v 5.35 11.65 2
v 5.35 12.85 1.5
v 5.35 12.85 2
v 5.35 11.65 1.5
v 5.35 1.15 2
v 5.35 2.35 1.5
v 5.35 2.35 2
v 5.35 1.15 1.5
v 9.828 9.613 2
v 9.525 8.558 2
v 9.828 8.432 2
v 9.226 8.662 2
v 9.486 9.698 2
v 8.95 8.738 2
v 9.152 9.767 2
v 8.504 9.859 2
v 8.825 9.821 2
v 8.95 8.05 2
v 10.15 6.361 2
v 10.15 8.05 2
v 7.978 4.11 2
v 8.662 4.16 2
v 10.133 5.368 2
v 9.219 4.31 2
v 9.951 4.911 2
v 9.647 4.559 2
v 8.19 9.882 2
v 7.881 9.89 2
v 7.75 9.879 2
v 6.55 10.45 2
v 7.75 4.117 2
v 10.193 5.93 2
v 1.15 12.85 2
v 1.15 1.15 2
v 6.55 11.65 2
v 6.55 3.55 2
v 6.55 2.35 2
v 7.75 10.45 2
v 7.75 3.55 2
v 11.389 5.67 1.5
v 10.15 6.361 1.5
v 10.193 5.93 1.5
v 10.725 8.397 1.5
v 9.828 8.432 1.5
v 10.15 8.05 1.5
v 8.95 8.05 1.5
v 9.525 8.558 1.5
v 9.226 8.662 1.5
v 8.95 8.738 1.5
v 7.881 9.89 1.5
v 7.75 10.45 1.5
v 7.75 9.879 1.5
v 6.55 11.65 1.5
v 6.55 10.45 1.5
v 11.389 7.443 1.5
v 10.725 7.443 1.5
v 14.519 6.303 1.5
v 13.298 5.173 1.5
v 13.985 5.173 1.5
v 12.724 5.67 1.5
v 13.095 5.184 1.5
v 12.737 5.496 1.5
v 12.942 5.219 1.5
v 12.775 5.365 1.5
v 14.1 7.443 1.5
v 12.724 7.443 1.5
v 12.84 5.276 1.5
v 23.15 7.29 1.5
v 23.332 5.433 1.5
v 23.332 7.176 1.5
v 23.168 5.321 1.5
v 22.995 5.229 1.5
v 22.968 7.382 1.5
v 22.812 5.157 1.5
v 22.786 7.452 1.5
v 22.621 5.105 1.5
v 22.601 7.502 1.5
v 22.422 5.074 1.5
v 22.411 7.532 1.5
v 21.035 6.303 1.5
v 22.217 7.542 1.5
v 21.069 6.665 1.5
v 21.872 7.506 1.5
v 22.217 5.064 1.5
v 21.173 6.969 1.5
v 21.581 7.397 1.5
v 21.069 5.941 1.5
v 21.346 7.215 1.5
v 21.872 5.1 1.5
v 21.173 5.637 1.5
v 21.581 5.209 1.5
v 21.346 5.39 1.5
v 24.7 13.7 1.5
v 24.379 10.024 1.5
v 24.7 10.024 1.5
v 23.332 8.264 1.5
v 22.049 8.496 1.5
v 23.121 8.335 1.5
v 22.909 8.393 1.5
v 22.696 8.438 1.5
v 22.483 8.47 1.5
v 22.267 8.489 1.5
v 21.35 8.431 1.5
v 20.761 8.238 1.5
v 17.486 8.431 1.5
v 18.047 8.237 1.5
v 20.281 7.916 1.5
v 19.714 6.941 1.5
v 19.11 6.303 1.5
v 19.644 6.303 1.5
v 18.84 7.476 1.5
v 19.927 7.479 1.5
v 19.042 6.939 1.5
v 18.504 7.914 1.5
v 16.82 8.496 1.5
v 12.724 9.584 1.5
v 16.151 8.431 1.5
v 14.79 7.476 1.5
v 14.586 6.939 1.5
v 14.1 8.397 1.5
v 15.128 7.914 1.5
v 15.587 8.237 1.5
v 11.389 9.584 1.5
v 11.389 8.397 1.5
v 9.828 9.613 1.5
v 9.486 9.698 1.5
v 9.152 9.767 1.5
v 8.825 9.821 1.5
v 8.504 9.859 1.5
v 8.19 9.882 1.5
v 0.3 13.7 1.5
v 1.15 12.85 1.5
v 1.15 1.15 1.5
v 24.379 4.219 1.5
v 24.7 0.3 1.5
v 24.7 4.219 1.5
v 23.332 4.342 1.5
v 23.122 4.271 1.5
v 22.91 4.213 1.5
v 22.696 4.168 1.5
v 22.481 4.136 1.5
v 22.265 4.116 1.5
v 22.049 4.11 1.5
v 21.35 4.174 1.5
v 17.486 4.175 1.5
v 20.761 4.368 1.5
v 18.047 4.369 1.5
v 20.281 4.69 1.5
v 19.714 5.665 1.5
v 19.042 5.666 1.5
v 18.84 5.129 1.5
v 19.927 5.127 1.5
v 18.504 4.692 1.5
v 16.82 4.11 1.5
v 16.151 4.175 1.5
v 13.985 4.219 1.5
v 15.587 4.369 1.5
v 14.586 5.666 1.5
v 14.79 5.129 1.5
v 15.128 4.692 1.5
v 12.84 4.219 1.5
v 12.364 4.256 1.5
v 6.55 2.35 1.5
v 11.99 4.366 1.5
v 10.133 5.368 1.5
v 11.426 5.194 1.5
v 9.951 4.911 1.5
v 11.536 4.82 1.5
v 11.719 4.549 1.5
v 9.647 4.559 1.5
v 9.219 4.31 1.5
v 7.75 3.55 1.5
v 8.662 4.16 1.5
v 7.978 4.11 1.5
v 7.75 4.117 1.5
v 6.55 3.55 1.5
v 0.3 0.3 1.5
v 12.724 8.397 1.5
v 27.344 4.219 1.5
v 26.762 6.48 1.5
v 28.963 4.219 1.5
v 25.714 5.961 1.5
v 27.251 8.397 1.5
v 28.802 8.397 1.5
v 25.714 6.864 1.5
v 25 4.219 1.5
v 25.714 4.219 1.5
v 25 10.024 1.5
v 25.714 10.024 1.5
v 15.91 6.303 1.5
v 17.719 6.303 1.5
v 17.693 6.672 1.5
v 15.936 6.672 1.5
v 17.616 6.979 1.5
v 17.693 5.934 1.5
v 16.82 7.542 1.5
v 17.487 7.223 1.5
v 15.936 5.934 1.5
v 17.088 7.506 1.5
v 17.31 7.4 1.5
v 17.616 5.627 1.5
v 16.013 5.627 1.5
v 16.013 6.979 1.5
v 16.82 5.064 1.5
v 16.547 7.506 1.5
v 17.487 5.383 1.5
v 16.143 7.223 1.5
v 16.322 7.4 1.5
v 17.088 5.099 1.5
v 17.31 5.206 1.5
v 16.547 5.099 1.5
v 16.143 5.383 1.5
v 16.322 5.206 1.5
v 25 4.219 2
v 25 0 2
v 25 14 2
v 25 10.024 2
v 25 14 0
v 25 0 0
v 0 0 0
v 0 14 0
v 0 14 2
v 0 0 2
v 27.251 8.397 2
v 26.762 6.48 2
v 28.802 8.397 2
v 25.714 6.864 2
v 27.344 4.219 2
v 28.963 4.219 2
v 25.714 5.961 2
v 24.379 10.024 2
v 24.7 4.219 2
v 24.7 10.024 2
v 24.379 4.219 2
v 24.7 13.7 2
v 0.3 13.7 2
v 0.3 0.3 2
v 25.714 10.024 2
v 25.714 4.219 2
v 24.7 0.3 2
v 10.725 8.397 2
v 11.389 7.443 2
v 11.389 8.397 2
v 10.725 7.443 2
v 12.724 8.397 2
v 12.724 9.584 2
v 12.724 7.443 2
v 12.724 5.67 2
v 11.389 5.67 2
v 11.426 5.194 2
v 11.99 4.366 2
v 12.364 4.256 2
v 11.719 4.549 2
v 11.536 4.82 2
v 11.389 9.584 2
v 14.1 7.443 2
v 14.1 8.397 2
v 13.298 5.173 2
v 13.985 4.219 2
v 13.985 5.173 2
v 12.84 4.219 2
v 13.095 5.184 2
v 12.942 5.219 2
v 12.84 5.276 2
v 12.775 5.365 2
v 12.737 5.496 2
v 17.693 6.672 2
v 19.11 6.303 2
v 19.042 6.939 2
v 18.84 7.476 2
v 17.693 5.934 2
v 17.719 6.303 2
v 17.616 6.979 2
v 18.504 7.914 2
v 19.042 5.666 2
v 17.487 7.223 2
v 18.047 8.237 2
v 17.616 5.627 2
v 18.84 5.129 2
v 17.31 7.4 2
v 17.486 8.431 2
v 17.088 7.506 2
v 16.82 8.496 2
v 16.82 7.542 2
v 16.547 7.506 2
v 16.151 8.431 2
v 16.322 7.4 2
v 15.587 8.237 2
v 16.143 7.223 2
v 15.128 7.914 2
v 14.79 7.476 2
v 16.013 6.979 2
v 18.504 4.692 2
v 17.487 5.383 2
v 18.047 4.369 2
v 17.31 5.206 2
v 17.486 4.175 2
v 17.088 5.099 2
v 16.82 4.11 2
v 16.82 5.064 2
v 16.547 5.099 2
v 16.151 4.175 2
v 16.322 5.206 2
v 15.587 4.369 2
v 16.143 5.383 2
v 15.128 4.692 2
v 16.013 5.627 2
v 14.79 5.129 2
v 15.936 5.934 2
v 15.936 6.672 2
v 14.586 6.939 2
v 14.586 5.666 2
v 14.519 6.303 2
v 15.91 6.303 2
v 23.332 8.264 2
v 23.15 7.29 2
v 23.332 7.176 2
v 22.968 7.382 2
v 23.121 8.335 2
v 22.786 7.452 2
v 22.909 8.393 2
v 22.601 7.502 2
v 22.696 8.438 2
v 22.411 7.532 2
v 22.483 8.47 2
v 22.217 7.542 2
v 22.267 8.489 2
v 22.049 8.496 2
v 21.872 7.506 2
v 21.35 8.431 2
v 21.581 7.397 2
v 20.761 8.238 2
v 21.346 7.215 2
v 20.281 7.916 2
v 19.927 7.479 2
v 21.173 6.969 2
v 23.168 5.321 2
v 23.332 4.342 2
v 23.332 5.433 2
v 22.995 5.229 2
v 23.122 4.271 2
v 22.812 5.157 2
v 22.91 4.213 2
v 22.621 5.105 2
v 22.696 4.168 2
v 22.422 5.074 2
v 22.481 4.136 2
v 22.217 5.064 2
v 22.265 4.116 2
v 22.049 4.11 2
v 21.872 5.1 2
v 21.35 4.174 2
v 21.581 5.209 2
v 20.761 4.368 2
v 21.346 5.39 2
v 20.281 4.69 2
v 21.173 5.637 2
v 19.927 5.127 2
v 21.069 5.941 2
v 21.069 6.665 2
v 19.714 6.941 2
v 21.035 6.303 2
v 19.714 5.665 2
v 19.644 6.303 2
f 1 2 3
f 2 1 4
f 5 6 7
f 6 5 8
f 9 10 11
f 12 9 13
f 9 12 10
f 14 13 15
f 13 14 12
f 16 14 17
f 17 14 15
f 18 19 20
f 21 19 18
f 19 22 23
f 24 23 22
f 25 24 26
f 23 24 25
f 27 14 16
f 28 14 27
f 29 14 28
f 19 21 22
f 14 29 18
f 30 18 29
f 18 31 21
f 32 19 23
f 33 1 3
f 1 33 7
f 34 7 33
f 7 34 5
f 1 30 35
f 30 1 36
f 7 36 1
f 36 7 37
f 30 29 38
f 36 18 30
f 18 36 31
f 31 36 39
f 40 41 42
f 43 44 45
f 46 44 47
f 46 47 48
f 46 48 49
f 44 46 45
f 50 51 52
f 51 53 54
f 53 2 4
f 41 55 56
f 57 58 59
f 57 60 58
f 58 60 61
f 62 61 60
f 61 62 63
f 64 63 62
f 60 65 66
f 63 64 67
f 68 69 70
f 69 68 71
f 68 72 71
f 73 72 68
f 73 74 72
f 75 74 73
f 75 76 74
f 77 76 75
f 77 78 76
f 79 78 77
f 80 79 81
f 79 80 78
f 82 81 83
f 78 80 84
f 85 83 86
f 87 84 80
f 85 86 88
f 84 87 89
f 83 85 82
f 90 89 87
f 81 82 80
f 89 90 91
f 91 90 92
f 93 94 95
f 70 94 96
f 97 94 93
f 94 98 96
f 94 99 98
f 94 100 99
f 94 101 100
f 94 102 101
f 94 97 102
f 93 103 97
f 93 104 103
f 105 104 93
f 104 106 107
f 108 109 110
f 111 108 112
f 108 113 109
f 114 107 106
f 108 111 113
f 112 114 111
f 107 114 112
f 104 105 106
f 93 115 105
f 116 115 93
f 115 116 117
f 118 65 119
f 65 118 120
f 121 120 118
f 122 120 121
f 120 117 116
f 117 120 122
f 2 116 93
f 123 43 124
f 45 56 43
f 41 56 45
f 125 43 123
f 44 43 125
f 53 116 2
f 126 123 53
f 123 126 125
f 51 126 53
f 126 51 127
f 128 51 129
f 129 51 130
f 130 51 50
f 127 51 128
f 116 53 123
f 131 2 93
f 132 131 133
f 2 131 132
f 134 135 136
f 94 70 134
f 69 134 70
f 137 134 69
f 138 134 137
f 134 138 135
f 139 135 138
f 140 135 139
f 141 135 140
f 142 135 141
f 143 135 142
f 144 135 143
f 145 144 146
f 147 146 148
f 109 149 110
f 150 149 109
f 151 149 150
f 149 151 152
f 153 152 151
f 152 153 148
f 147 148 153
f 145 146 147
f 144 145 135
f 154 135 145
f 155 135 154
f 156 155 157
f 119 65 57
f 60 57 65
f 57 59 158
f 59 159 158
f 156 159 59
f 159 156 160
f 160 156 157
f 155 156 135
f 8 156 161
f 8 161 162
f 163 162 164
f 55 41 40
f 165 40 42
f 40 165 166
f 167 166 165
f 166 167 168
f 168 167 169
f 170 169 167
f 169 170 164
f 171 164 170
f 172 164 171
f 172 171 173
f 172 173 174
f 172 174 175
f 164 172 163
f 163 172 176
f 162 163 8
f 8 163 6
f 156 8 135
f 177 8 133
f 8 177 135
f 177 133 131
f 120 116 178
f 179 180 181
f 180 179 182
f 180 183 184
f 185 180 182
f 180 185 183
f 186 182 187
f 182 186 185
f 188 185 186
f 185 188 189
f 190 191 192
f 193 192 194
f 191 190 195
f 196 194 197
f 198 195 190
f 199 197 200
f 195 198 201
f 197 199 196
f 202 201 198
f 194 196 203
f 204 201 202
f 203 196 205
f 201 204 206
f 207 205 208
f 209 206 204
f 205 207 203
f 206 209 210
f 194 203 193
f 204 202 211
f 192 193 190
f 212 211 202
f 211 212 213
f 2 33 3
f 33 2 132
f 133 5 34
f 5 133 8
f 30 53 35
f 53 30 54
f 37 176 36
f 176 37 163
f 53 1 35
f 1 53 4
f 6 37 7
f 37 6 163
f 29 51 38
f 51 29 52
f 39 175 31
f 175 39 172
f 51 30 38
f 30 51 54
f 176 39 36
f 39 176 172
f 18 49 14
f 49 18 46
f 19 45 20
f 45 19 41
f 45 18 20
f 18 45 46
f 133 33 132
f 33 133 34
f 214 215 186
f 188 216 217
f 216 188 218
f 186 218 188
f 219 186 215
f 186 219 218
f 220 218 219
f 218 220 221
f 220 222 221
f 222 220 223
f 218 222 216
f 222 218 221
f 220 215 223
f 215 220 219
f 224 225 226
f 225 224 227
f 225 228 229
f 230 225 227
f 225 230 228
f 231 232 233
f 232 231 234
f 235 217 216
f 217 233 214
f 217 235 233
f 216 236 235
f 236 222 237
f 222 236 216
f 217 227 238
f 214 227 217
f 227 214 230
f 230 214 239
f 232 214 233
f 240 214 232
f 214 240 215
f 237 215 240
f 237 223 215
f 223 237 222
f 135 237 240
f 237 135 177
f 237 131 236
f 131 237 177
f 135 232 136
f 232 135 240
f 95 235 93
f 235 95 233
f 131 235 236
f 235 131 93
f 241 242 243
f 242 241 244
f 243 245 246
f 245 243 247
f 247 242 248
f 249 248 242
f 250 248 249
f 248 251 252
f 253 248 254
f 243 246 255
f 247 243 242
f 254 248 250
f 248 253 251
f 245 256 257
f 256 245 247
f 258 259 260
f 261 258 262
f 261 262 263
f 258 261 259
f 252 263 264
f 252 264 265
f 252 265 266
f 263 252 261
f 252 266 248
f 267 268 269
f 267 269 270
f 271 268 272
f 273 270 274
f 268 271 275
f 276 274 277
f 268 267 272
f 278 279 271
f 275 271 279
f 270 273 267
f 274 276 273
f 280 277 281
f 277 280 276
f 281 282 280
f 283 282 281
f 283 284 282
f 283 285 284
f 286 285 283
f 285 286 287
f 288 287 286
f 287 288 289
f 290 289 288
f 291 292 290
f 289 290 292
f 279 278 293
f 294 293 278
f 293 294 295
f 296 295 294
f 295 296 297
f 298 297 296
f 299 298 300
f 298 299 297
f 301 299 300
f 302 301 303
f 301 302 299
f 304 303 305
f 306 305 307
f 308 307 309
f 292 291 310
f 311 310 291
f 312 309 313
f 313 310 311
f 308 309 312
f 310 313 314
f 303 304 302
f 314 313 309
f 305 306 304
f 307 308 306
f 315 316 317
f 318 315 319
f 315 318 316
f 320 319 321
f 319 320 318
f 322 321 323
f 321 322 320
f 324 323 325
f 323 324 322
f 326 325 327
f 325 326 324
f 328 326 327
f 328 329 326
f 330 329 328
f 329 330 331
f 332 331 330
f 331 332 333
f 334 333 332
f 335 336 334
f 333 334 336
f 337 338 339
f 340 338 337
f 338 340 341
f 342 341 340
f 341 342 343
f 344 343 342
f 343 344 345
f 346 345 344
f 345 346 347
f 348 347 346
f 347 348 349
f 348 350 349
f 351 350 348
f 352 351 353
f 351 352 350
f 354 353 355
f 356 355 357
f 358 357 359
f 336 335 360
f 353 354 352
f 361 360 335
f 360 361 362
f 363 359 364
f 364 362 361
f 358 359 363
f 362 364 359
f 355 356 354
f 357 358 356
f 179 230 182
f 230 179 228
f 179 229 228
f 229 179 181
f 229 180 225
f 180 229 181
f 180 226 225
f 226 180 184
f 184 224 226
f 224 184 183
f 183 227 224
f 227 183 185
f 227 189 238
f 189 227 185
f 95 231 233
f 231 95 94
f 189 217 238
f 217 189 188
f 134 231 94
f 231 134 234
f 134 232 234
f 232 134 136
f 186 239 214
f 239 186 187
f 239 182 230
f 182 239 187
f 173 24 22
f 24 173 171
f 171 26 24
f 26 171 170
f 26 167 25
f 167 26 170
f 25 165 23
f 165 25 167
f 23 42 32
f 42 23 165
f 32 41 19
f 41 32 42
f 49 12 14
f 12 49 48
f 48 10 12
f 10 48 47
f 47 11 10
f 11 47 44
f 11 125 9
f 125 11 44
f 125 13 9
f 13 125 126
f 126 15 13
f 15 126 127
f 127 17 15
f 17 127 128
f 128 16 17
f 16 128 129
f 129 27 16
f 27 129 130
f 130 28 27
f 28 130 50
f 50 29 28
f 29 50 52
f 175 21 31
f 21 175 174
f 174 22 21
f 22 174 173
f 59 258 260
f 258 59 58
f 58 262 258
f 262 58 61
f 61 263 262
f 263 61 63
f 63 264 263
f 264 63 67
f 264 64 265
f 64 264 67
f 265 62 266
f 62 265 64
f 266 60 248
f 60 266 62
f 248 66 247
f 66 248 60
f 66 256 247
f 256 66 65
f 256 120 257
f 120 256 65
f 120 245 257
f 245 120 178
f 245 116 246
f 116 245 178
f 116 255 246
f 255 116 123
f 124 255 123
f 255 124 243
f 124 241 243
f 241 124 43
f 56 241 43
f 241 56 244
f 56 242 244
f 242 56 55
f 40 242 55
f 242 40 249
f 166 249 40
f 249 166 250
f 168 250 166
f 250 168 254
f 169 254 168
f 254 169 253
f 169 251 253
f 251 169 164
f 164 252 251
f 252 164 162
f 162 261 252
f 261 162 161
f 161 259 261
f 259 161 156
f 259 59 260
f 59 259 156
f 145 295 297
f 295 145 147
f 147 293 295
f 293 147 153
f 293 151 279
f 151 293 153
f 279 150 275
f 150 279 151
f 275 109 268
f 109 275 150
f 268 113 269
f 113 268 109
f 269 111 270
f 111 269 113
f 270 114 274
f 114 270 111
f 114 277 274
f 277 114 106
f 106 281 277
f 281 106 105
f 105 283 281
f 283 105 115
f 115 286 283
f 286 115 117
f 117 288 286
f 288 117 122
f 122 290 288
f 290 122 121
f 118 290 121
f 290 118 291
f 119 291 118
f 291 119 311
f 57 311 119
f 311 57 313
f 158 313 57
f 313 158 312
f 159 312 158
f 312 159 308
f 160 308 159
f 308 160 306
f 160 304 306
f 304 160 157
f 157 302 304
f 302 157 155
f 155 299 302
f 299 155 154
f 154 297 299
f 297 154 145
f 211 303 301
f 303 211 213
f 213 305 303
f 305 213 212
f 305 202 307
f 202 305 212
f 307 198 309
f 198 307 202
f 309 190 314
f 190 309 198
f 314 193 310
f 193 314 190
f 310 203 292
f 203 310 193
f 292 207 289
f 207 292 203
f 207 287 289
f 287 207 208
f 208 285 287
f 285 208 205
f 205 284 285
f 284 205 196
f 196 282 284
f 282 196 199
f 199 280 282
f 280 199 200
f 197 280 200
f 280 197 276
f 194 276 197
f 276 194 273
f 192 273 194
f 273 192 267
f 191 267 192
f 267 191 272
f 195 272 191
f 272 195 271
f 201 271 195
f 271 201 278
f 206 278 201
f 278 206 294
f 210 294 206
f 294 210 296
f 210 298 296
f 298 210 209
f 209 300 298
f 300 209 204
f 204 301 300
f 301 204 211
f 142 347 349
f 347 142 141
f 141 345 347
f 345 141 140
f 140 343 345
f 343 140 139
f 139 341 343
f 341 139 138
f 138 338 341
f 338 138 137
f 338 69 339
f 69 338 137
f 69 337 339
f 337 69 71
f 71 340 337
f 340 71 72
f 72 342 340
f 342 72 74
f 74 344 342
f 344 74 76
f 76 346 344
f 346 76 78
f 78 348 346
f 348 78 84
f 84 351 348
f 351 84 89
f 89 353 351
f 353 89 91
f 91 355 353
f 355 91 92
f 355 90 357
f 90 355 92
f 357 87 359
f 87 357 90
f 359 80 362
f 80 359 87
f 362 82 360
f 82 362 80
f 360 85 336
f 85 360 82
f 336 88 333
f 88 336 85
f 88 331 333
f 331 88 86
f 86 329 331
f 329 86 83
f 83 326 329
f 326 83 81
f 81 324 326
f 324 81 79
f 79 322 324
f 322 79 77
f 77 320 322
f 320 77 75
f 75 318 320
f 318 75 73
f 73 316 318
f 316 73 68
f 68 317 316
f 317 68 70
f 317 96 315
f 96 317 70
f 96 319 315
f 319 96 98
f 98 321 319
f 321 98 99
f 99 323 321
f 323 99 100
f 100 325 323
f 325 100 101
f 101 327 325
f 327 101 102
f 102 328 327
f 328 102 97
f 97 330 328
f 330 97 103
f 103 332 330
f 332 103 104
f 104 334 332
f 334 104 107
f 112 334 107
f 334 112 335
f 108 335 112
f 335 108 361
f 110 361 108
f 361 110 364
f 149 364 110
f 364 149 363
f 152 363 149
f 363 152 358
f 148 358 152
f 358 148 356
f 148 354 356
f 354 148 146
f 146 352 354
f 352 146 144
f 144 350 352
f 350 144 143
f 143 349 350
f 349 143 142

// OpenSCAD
// file: CommonModules.scad
//    $$$$$$\   $$$$$$\   $$$$$$\  $$\   $$\ $$$$$$\ $$$$$$$\  $$$$$$$$\ 
//    $$  __$$\ $$  __$$\ $$  __$$\ $$ |  $$ |\_$$  _|$$  __$$\ $$  _____|
//    $$ /  $$ |$$ /  \__|$$ /  $$ |$$ |  $$ |  $$ |  $$ |  $$ |$$ |      
//    $$$$$$$$ |$$ |      $$ |  $$ |$$ |  $$ |  $$ |  $$$$$$$  |$$$$$\    
//    $$  __$$ |$$ |      $$ |  $$ |$$ |  $$ |  $$ |  $$  __$$< $$  __|   
//    $$ |  $$ |$$ |  $$\ $$ $$\$$ |$$ |  $$ |  $$ |  $$ |  $$ |$$ |      
//    $$ |  $$ |\$$$$$$  |\$$$$$$ / \$$$$$$  |$$$$$$\ $$ |  $$ |$$$$$$$$\ 
//    \__|  \__| \______/  \___$$$\  \______/ \______|\__|  \__|\________|
//                            \___|                                      
//      
//       Print and play - OpenScad project - by Bekkalizer - GPLv3
// 
// This file is part of the Acquire stl project.
// Copyright (C) 2025 Bekkalizer
//
// Acquire stl project is free software: you can redistribute it and/or modify
// it under the terms of the GNU General Public License as published
// by the Free Software Foundation, either version 3 of the License,
// or (at your option) any later version.
//
// Acquire stl project is distributed in the hope that it will be useful,
// but WITHOUT ANY WARRANTY; without even the implied warranty of
// MERCHANTABILITY or FITNESS FOR A PARTICULAR PURPOSE. See the
// GNU General Public License for more details.
//
// You should have received a copy of the GNU General Public License
// along with this program. If not, see <https://www.gnu.org/licenses/>.

module cube_with_extruded_bottom( cube_size = [19.5, 19.5, 5] ) {
    //Main build script parameters:
    max_width = 19.2;
    top_lip = 2;
    top_height = 3;
    //Calculated hole size:
    inside_margins = 1;
    hole_width = max_width - 2 * (top_lip) + inside_margins;
    hole_height = top_height + inside_margins;
    
    hole_size = [hole_width, hole_width, hole_height]; // Hole dimensions (same height as cube)
    hole_offset = [(cube_size[0] - hole_size[0]) / 2, (cube_size[1] - hole_size[1]) / 2, -0.1]; // Centered on bottom
    difference() {
        // Main Cube
        cube(cube_size);
        
        // Hole Cube (subtracting from bottom)
        translate(hole_offset)
            cube(hole_size);
    }
}
// main file
//    $$$$$$\   $$$$$$\   $$$$$$\  $$\   $$\ $$$$$$\ $$$$$$$\  $$$$$$$$\ 
//    $$  __$$\ $$  __$$\ $$  __$$\ $$ |  $$ |\_$$  _|$$  __$$\ $$  _____|
//    $$ /  $$ |$$ /  \__|$$ /  $$ |$$ |  $$ |  $$ |  $$ |  $$ |$$ |      
//    $$$$$$$$ |$$ |      $$ |  $$ |$$ |  $$ |  $$ |  $$$$$$$  |$$$$$\    
//    $$  __$$ |$$ |      $$ |  $$ |$$ |  $$ |  $$ |  $$  __$$< $$  __|   
//    $$ |  $$ |$$ |  $$\ $$ $$\$$ |$$ |  $$ |  $$ |  $$ |  $$ |$$ |      
//    $$ |  $$ |\$$$$$$  |\$$$$$$ / \$$$$$$  |$$$$$$\ $$ |  $$ |$$$$$$$$\ 
//    \__|  \__| \______/  \___$$$\  \______/ \______|\__|  \__|\________|
//                            \___|                                      
//      
//       Print and play - OpenScad project - by Bekkalizer - GPLv3
// 
// This file is part of the Acquire stl project.
// Copyright (C) 2025 Bekkalizer
//
// Acquire stl project is free software: you can redistribute it and/or modify
// it under the terms of the GNU General Public License as published
// by the Free Software Foundation, either version 3 of the License,
// or (at your option) any later version.
//
// Acquire stl project is distributed in the hope that it will be useful,
// but WITHOUT ANY WARRANTY; without even the implied warranty of
// MERCHANTABILITY or FITNESS FOR A PARTICULAR PURPOSE. See the
// GNU General Public License for more details.
//
// You should have received a copy of the GNU General Public License
// along with this program. If not, see <https://www.gnu.org/licenses/>.

use <CommonModules.scad>

// ============== Parameters ==============
width = 14;
height = 25;
thickness = 1.5;
extrusion = 0.5;

label = "Stock";

frame_width = 0.3;

font_name = "DIN Condensed:style=Bold";
font_size = 5.5;

symbol_factor = 0.6;
symbol_bottom_width = 19.5 * symbol_factor;
symbol_bottom_height = 5 * symbol_factor;
symbol_step_height = 2 * symbol_factor;
symbol_step_width = 2 * symbol_factor;
symbol_number_of_steps = 4;

symbol_margin = (width-symbol_bottom_width)/2;

// Draw the certificate main and frame;
cube([height,width,thickness]);
cube([height,frame_width,thickness + extrusion]);
cube([frame_width,width,thickness + extrusion]);
translate([height - frame_width,0,0])
    cube([frame_width,width,thickness + extrusion]);
translate([0,width - frame_width,0])
    cube([height,frame_width,thickness + extrusion]);

translate ([symbol_margin,symbol_margin,thickness]) {
    cube([symbol_bottom_height, symbol_bottom_width, extrusion]);
    
    
    for( i = [0 : symbol_number_of_steps] ) {
        echo(symbol_bottom_width - symbol_step_width*2*i);
        
        translate([symbol_step_height*i + symbol_bottom_height,symbol_step_width*i,0]) {
            cube([symbol_step_height, 
                symbol_bottom_width - symbol_step_width*2*i, 
                extrusion]);
        }
    }
}

// Etched text on top
translate([(height + symbol_margin + symbol_bottom_height + symbol_step_height * symbol_number_of_steps)/2,width/2,thickness])
    linear_extrude(height = extrusion)
        text(label, size = font_size, font = font_name, halign = "center", valign = "center");
